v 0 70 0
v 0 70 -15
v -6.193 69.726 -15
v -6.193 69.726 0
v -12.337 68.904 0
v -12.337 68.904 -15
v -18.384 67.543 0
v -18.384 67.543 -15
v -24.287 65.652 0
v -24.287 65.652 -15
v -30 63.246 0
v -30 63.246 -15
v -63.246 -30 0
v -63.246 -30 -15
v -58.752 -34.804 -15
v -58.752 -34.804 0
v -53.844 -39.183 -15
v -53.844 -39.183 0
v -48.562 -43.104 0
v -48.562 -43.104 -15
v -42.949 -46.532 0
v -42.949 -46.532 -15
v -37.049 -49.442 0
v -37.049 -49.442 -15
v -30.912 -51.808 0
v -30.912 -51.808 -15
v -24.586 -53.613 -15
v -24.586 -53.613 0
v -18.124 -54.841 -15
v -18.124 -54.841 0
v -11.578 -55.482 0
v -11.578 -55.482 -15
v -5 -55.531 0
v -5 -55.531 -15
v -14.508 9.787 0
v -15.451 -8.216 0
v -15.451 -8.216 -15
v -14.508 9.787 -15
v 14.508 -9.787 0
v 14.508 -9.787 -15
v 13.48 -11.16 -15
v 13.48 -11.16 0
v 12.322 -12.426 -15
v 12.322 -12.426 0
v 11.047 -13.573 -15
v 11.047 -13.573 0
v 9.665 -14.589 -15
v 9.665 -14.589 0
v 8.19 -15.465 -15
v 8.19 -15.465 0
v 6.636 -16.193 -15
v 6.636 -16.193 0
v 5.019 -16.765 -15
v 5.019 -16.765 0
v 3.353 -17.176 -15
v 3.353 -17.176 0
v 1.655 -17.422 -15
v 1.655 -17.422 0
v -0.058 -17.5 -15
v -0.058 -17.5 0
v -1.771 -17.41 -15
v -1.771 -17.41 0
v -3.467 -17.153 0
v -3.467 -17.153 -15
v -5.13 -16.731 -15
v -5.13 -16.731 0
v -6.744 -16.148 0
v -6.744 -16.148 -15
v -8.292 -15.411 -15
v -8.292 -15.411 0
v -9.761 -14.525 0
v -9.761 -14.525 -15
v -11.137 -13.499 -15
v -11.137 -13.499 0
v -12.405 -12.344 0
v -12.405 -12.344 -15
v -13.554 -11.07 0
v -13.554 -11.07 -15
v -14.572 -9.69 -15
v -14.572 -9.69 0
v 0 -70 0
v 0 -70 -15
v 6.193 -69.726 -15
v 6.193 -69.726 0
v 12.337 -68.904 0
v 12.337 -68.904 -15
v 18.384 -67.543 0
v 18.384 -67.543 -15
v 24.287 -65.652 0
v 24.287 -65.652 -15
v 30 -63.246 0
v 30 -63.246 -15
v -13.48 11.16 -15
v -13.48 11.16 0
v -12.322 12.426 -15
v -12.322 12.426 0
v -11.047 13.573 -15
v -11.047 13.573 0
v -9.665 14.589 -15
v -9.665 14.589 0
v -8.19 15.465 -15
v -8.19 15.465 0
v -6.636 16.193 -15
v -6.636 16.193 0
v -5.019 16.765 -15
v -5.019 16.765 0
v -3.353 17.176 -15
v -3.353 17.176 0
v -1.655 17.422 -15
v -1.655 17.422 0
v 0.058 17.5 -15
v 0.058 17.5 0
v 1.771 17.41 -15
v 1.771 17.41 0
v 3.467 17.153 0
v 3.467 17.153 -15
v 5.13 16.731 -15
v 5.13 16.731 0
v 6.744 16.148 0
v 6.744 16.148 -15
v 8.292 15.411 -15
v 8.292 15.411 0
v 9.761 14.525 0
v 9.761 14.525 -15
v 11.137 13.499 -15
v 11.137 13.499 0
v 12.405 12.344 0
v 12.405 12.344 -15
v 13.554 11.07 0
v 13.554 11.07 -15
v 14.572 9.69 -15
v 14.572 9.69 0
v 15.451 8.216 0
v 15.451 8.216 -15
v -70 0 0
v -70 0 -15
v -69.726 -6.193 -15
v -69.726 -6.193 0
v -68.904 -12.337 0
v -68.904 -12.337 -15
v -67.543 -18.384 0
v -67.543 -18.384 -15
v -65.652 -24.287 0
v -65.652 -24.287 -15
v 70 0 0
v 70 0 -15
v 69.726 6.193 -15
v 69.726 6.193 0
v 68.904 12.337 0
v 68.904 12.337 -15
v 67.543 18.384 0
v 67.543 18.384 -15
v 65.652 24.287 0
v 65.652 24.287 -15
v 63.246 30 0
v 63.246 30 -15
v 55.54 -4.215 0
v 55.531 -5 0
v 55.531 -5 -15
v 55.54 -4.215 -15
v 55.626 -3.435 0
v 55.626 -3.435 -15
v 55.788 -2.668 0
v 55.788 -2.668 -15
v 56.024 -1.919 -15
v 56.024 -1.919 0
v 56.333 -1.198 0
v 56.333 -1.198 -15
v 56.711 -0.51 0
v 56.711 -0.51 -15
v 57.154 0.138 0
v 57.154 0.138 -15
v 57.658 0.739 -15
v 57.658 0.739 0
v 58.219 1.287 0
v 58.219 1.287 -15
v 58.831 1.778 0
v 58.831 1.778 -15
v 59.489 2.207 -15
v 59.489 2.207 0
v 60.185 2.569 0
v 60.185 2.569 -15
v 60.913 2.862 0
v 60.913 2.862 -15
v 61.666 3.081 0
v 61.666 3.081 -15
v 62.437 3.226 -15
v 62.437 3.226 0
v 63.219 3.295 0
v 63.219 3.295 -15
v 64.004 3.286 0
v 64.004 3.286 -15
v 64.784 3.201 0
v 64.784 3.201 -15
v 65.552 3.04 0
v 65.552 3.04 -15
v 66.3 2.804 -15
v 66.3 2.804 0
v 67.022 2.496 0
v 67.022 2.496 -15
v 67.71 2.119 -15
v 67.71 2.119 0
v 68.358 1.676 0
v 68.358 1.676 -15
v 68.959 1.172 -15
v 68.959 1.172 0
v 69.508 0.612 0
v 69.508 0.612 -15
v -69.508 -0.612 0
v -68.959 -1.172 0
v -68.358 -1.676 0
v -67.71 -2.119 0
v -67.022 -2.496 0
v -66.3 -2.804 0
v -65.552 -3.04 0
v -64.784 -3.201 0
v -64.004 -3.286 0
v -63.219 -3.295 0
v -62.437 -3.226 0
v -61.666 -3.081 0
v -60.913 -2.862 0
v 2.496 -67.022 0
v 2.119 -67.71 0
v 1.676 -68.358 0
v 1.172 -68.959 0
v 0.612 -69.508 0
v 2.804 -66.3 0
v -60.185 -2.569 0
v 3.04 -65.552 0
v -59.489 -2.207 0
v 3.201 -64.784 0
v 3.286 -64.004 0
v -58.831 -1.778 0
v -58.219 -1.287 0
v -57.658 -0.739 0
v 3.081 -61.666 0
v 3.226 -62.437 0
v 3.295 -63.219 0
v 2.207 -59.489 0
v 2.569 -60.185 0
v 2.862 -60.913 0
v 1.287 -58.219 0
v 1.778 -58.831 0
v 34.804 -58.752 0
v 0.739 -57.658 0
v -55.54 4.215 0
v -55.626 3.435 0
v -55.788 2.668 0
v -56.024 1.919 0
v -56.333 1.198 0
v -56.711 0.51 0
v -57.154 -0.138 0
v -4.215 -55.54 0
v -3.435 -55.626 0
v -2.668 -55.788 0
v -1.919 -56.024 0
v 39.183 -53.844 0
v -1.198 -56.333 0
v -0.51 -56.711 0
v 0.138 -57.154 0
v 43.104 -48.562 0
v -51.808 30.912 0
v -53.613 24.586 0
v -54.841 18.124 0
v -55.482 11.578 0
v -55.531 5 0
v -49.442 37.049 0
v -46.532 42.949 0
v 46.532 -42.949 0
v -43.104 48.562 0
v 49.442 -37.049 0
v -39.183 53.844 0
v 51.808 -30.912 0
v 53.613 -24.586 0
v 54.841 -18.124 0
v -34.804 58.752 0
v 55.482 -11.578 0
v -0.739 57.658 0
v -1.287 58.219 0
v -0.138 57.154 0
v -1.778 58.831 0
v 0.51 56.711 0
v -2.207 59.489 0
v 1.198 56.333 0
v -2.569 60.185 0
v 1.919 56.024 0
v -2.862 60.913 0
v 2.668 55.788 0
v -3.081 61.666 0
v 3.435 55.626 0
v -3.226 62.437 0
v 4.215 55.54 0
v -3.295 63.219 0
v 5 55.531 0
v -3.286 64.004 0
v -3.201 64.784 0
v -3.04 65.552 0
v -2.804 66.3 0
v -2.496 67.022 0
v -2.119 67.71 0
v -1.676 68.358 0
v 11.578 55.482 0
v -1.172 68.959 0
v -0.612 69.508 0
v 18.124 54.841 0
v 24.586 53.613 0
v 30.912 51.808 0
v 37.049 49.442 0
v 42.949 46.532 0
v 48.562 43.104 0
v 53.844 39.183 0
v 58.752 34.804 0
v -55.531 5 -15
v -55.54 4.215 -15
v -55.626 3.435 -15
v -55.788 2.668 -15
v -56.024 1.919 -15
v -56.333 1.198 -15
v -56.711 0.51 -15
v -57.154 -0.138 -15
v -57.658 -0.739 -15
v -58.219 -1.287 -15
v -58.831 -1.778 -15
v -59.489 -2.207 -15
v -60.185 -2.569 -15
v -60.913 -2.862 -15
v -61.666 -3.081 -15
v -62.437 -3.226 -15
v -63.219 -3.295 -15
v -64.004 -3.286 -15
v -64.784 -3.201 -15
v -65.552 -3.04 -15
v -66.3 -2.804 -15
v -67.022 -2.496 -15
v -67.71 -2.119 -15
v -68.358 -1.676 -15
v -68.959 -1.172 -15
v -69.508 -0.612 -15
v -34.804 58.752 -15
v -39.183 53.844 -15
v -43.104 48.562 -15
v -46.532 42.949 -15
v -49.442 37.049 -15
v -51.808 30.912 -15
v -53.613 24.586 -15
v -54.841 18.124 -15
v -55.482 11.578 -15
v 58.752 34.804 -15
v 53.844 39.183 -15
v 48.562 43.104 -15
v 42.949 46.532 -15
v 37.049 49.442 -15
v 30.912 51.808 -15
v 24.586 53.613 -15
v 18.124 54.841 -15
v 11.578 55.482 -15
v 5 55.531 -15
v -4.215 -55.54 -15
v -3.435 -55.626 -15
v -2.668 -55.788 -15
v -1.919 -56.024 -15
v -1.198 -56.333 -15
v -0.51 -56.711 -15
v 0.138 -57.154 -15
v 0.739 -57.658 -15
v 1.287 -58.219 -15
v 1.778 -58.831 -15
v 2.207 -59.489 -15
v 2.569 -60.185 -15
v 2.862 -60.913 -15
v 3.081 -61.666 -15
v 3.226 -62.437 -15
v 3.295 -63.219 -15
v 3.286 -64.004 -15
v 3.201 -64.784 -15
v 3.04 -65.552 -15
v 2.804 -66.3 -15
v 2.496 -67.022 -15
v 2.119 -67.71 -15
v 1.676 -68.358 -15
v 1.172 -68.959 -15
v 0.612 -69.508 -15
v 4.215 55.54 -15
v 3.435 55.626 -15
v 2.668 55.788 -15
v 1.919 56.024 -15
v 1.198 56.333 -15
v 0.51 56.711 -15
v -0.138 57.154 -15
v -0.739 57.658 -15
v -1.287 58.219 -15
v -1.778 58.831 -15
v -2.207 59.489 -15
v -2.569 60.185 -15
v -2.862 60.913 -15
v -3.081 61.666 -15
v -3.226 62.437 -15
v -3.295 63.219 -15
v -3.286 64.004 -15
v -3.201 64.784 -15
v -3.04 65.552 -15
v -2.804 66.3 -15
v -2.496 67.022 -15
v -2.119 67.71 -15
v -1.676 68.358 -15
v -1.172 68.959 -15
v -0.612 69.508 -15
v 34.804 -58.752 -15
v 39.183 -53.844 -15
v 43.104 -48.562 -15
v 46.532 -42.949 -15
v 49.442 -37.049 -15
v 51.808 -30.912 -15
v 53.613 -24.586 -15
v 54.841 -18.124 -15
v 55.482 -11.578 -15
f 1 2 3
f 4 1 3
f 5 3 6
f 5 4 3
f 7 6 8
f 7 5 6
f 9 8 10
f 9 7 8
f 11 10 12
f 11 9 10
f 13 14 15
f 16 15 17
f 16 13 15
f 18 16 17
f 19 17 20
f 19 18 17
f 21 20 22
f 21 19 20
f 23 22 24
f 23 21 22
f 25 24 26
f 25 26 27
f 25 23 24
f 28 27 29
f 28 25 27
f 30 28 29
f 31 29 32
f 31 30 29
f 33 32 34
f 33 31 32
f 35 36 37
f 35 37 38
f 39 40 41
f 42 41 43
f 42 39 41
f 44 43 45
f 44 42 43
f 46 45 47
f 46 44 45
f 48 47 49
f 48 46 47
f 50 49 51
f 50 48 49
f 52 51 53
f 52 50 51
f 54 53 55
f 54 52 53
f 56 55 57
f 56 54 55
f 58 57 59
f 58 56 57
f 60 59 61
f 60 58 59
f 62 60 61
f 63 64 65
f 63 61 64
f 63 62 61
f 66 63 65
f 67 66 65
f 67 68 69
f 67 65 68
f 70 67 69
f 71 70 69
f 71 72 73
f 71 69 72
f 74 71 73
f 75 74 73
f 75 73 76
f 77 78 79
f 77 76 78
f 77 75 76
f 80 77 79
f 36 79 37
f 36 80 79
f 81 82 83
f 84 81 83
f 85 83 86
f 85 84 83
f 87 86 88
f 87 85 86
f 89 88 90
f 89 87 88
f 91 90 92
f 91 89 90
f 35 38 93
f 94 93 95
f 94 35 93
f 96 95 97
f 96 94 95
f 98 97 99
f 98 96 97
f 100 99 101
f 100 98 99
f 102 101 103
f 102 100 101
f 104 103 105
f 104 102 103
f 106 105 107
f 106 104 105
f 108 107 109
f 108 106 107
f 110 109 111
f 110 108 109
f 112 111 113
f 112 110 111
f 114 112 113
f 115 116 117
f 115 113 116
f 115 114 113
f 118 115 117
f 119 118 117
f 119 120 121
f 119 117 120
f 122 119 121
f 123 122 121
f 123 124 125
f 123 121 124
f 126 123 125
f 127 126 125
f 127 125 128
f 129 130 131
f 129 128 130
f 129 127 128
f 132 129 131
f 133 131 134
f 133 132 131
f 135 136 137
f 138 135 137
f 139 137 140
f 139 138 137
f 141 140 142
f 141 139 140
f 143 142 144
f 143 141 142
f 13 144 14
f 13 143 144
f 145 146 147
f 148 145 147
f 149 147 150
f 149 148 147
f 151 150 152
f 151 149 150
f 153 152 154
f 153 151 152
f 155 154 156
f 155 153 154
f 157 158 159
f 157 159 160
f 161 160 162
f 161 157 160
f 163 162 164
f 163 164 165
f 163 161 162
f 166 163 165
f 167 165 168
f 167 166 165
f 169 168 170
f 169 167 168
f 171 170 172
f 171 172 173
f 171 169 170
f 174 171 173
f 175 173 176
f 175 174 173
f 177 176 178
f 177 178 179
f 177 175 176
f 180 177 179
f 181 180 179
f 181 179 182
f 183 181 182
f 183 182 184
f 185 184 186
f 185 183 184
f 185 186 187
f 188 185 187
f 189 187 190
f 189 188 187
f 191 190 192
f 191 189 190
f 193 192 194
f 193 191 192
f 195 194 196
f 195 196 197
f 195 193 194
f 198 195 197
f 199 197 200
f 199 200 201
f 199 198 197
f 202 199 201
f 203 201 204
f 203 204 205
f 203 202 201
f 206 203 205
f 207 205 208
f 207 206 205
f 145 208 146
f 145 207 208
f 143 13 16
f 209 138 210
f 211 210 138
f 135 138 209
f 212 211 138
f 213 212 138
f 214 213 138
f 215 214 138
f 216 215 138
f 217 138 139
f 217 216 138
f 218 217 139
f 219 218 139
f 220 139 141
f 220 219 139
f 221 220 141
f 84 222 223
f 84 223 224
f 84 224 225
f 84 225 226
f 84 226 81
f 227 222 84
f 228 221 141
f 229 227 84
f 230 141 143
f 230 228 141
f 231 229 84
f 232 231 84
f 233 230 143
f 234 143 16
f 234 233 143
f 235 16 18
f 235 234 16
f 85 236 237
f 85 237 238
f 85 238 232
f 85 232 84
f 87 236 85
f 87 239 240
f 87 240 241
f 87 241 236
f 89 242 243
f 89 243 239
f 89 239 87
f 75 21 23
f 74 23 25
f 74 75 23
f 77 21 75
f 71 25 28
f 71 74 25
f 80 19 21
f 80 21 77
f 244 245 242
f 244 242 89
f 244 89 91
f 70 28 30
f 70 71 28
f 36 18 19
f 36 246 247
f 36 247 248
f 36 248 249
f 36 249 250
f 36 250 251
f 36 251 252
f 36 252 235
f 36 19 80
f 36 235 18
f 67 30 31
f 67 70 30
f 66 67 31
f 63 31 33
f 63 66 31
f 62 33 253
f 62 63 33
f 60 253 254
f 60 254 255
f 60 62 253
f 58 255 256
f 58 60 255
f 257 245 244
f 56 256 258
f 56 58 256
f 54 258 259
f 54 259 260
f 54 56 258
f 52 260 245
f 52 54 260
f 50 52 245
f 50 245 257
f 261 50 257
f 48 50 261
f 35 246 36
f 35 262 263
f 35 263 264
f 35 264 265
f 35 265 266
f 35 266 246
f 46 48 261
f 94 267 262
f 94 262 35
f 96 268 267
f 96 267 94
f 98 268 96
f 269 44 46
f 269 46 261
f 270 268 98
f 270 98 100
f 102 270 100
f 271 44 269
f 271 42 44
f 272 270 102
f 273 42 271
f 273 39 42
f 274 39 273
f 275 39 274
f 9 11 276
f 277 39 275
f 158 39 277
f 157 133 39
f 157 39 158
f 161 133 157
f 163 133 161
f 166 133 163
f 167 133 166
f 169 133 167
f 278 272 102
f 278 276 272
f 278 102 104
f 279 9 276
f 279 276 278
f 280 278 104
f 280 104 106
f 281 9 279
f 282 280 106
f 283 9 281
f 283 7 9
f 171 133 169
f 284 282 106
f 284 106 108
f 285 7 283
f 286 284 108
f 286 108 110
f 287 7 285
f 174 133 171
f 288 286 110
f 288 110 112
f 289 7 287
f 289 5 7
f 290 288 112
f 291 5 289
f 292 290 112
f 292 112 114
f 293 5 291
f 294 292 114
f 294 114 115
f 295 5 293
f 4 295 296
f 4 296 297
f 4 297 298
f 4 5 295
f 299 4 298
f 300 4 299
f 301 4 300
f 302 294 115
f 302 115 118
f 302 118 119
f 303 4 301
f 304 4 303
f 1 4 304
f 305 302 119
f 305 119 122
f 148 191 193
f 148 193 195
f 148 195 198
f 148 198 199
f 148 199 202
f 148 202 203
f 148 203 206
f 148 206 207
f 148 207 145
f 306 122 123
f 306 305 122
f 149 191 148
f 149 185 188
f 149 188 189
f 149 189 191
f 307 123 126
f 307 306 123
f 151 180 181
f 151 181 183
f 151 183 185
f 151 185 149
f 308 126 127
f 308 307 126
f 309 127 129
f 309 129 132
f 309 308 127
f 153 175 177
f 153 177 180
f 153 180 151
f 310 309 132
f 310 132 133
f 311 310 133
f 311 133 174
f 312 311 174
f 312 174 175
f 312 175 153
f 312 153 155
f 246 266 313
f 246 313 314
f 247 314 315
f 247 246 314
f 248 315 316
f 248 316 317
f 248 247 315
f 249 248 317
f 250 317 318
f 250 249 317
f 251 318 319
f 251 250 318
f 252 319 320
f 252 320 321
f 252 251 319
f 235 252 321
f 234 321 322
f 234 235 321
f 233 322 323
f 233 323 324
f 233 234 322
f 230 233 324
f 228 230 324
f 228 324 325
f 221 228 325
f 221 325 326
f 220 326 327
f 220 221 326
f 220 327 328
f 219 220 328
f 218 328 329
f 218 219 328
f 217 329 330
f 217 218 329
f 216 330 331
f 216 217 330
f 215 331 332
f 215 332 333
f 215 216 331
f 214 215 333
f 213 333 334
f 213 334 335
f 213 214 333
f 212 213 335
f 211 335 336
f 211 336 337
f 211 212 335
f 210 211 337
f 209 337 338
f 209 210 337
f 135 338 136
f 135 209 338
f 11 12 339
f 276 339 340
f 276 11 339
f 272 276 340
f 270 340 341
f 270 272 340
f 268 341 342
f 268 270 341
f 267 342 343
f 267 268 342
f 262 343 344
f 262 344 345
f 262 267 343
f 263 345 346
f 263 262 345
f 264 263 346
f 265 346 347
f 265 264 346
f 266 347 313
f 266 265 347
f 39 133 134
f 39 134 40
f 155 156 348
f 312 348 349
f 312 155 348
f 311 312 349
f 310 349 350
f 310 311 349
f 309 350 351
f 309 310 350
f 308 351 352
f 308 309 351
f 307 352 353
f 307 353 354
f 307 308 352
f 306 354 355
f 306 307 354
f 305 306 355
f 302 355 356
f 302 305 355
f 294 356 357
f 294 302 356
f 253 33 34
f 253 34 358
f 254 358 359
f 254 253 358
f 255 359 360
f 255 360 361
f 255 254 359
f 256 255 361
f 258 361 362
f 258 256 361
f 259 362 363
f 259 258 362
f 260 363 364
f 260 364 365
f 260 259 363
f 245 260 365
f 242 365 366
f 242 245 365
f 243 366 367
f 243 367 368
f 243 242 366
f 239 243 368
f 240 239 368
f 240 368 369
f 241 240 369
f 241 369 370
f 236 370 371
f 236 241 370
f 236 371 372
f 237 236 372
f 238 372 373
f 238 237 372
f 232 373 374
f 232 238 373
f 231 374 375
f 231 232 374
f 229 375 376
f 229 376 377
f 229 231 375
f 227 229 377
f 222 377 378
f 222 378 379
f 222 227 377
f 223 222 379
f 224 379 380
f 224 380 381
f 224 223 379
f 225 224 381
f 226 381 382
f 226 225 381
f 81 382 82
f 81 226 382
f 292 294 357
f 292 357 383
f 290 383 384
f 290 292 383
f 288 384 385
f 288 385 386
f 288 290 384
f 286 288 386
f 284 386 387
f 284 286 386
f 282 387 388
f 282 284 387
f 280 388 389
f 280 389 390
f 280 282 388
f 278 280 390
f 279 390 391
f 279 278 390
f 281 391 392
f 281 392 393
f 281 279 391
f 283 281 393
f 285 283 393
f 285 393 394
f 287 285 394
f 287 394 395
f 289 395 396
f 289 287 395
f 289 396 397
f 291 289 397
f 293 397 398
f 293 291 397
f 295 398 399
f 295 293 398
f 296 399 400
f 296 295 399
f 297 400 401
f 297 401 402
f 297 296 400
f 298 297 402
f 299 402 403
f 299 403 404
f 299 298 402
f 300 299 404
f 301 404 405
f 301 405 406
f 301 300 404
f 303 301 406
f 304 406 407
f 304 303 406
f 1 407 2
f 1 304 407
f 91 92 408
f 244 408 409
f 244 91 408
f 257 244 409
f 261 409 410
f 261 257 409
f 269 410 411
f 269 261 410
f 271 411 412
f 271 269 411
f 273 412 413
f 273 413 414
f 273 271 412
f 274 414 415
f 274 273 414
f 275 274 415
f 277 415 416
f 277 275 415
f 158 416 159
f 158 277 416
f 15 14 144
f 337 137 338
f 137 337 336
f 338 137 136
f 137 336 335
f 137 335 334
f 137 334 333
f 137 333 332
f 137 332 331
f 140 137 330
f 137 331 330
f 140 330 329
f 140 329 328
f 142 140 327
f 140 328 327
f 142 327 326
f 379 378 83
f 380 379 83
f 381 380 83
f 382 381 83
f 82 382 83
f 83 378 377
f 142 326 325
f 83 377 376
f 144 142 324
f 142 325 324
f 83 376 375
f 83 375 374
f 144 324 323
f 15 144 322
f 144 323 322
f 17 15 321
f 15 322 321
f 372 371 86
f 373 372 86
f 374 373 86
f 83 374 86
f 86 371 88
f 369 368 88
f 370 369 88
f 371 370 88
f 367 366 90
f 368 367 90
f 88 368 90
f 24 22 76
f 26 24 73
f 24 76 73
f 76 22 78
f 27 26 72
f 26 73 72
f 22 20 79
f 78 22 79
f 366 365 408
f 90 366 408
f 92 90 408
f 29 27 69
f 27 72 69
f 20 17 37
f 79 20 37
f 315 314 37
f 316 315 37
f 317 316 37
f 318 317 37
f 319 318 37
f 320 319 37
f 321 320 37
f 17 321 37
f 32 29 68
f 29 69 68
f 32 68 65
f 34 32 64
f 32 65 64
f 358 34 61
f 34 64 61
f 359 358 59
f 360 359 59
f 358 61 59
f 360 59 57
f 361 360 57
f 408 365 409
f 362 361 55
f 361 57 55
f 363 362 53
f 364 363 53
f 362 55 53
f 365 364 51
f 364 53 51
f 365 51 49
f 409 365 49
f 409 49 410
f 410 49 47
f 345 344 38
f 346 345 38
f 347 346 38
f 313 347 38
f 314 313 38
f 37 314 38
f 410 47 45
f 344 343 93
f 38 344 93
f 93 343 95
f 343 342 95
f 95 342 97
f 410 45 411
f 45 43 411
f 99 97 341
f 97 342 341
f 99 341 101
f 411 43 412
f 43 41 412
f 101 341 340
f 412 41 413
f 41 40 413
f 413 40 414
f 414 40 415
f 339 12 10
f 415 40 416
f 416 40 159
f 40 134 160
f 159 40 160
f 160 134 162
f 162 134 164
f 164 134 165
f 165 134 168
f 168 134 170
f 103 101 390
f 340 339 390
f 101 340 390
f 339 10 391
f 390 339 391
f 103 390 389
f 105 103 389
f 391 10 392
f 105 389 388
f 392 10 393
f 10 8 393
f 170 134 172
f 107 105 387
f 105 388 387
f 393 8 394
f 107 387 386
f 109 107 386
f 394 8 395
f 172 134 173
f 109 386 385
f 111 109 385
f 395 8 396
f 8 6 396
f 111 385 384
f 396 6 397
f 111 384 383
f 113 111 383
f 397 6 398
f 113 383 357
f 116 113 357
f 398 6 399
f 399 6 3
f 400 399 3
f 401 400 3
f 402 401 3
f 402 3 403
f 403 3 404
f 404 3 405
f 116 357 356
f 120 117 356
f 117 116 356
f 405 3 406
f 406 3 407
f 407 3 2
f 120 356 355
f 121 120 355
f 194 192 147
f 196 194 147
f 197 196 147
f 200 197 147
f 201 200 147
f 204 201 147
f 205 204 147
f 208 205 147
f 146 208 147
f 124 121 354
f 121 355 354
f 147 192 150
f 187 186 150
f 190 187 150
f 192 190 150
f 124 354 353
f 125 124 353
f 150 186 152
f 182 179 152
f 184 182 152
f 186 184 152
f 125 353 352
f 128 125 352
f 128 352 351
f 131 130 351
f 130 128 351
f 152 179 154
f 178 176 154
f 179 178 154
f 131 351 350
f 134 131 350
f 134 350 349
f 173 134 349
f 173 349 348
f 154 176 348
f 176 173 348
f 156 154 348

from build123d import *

# Parameters (mm, degrees)
TABAN_FLAN_1_DEPTH    = 15
KES_EKSTR_ZYON1_DEPTH = 101.124921973


# Sheet-metal steps are written as plain solids
with BuildPart() as part:
    # Çizim1 → Taban-Flanş1 (new body)
    with BuildSketch(Plane.XY):
        with BuildLine():
            ThreePointArc((-70, 0), (-68.290514437, -15.375488216), (-63.245553203, -30))
            ThreePointArc((-63.245553203, -30), (-37.049172752, -49.441795719), (-5, -55.531483348))
            ThreePointArc((-5, -55.531483348), (2.861742557, -60.912841793), (0, -70))
            ThreePointArc((0, -70), (15.375488216, -68.290514437), (30, -63.245553203))
            ThreePointArc((30, -63.245553203), (49.441795719, -37.049172752), (55.531483348, -5))
            ThreePointArc((55.531483348, -5), (60.912841793, 2.861742557), (70, 0))
            ThreePointArc((70, 0), (68.290514437, 15.375488216), (63.245553203, 30))
            ThreePointArc((63.245553203, 30), (37.049172752, 49.441795719), (5, 55.531483348))
            ThreePointArc((5, 55.531483348), (-2.861742557, 60.912841793), (0, 70))
            ThreePointArc((0, 70), (-15.375488216, 68.290514437), (-30, 63.245553203))
            ThreePointArc((-30, 63.245553203), (-49.441795719, 37.049172752), (-55.531483348, 5))
            ThreePointArc((-55.531483348, 5), (-60.912841793, -2.861742557), (-70, 0))
        make_face()
    extrude(amount=-TABAN_FLAN_1_DEPTH)

    # Çizim8 → Kes-Ekstrüzyon1 (cut, through all)
    with BuildSketch(Plane.XY):
        with BuildLine():
            Line((-15.451192956, -8.216485638), (-14.507693087, 9.786564326))
            ThreePointArc((-14.507693087, 9.786564326), (0.915879234, 17.476016858), (15.451192956, 8.216485638))
            Line((15.451192956, 8.216485638), (14.507693087, -9.786564326))
            ThreePointArc((14.507693087, -9.786564326), (-0.915879234, -17.476016858), (-15.451192956, -8.216485638))
        make_face()
    extrude(amount=-KES_EKSTR_ZYON1_DEPTH, mode=Mode.SUBTRACT)


solid = part.part
